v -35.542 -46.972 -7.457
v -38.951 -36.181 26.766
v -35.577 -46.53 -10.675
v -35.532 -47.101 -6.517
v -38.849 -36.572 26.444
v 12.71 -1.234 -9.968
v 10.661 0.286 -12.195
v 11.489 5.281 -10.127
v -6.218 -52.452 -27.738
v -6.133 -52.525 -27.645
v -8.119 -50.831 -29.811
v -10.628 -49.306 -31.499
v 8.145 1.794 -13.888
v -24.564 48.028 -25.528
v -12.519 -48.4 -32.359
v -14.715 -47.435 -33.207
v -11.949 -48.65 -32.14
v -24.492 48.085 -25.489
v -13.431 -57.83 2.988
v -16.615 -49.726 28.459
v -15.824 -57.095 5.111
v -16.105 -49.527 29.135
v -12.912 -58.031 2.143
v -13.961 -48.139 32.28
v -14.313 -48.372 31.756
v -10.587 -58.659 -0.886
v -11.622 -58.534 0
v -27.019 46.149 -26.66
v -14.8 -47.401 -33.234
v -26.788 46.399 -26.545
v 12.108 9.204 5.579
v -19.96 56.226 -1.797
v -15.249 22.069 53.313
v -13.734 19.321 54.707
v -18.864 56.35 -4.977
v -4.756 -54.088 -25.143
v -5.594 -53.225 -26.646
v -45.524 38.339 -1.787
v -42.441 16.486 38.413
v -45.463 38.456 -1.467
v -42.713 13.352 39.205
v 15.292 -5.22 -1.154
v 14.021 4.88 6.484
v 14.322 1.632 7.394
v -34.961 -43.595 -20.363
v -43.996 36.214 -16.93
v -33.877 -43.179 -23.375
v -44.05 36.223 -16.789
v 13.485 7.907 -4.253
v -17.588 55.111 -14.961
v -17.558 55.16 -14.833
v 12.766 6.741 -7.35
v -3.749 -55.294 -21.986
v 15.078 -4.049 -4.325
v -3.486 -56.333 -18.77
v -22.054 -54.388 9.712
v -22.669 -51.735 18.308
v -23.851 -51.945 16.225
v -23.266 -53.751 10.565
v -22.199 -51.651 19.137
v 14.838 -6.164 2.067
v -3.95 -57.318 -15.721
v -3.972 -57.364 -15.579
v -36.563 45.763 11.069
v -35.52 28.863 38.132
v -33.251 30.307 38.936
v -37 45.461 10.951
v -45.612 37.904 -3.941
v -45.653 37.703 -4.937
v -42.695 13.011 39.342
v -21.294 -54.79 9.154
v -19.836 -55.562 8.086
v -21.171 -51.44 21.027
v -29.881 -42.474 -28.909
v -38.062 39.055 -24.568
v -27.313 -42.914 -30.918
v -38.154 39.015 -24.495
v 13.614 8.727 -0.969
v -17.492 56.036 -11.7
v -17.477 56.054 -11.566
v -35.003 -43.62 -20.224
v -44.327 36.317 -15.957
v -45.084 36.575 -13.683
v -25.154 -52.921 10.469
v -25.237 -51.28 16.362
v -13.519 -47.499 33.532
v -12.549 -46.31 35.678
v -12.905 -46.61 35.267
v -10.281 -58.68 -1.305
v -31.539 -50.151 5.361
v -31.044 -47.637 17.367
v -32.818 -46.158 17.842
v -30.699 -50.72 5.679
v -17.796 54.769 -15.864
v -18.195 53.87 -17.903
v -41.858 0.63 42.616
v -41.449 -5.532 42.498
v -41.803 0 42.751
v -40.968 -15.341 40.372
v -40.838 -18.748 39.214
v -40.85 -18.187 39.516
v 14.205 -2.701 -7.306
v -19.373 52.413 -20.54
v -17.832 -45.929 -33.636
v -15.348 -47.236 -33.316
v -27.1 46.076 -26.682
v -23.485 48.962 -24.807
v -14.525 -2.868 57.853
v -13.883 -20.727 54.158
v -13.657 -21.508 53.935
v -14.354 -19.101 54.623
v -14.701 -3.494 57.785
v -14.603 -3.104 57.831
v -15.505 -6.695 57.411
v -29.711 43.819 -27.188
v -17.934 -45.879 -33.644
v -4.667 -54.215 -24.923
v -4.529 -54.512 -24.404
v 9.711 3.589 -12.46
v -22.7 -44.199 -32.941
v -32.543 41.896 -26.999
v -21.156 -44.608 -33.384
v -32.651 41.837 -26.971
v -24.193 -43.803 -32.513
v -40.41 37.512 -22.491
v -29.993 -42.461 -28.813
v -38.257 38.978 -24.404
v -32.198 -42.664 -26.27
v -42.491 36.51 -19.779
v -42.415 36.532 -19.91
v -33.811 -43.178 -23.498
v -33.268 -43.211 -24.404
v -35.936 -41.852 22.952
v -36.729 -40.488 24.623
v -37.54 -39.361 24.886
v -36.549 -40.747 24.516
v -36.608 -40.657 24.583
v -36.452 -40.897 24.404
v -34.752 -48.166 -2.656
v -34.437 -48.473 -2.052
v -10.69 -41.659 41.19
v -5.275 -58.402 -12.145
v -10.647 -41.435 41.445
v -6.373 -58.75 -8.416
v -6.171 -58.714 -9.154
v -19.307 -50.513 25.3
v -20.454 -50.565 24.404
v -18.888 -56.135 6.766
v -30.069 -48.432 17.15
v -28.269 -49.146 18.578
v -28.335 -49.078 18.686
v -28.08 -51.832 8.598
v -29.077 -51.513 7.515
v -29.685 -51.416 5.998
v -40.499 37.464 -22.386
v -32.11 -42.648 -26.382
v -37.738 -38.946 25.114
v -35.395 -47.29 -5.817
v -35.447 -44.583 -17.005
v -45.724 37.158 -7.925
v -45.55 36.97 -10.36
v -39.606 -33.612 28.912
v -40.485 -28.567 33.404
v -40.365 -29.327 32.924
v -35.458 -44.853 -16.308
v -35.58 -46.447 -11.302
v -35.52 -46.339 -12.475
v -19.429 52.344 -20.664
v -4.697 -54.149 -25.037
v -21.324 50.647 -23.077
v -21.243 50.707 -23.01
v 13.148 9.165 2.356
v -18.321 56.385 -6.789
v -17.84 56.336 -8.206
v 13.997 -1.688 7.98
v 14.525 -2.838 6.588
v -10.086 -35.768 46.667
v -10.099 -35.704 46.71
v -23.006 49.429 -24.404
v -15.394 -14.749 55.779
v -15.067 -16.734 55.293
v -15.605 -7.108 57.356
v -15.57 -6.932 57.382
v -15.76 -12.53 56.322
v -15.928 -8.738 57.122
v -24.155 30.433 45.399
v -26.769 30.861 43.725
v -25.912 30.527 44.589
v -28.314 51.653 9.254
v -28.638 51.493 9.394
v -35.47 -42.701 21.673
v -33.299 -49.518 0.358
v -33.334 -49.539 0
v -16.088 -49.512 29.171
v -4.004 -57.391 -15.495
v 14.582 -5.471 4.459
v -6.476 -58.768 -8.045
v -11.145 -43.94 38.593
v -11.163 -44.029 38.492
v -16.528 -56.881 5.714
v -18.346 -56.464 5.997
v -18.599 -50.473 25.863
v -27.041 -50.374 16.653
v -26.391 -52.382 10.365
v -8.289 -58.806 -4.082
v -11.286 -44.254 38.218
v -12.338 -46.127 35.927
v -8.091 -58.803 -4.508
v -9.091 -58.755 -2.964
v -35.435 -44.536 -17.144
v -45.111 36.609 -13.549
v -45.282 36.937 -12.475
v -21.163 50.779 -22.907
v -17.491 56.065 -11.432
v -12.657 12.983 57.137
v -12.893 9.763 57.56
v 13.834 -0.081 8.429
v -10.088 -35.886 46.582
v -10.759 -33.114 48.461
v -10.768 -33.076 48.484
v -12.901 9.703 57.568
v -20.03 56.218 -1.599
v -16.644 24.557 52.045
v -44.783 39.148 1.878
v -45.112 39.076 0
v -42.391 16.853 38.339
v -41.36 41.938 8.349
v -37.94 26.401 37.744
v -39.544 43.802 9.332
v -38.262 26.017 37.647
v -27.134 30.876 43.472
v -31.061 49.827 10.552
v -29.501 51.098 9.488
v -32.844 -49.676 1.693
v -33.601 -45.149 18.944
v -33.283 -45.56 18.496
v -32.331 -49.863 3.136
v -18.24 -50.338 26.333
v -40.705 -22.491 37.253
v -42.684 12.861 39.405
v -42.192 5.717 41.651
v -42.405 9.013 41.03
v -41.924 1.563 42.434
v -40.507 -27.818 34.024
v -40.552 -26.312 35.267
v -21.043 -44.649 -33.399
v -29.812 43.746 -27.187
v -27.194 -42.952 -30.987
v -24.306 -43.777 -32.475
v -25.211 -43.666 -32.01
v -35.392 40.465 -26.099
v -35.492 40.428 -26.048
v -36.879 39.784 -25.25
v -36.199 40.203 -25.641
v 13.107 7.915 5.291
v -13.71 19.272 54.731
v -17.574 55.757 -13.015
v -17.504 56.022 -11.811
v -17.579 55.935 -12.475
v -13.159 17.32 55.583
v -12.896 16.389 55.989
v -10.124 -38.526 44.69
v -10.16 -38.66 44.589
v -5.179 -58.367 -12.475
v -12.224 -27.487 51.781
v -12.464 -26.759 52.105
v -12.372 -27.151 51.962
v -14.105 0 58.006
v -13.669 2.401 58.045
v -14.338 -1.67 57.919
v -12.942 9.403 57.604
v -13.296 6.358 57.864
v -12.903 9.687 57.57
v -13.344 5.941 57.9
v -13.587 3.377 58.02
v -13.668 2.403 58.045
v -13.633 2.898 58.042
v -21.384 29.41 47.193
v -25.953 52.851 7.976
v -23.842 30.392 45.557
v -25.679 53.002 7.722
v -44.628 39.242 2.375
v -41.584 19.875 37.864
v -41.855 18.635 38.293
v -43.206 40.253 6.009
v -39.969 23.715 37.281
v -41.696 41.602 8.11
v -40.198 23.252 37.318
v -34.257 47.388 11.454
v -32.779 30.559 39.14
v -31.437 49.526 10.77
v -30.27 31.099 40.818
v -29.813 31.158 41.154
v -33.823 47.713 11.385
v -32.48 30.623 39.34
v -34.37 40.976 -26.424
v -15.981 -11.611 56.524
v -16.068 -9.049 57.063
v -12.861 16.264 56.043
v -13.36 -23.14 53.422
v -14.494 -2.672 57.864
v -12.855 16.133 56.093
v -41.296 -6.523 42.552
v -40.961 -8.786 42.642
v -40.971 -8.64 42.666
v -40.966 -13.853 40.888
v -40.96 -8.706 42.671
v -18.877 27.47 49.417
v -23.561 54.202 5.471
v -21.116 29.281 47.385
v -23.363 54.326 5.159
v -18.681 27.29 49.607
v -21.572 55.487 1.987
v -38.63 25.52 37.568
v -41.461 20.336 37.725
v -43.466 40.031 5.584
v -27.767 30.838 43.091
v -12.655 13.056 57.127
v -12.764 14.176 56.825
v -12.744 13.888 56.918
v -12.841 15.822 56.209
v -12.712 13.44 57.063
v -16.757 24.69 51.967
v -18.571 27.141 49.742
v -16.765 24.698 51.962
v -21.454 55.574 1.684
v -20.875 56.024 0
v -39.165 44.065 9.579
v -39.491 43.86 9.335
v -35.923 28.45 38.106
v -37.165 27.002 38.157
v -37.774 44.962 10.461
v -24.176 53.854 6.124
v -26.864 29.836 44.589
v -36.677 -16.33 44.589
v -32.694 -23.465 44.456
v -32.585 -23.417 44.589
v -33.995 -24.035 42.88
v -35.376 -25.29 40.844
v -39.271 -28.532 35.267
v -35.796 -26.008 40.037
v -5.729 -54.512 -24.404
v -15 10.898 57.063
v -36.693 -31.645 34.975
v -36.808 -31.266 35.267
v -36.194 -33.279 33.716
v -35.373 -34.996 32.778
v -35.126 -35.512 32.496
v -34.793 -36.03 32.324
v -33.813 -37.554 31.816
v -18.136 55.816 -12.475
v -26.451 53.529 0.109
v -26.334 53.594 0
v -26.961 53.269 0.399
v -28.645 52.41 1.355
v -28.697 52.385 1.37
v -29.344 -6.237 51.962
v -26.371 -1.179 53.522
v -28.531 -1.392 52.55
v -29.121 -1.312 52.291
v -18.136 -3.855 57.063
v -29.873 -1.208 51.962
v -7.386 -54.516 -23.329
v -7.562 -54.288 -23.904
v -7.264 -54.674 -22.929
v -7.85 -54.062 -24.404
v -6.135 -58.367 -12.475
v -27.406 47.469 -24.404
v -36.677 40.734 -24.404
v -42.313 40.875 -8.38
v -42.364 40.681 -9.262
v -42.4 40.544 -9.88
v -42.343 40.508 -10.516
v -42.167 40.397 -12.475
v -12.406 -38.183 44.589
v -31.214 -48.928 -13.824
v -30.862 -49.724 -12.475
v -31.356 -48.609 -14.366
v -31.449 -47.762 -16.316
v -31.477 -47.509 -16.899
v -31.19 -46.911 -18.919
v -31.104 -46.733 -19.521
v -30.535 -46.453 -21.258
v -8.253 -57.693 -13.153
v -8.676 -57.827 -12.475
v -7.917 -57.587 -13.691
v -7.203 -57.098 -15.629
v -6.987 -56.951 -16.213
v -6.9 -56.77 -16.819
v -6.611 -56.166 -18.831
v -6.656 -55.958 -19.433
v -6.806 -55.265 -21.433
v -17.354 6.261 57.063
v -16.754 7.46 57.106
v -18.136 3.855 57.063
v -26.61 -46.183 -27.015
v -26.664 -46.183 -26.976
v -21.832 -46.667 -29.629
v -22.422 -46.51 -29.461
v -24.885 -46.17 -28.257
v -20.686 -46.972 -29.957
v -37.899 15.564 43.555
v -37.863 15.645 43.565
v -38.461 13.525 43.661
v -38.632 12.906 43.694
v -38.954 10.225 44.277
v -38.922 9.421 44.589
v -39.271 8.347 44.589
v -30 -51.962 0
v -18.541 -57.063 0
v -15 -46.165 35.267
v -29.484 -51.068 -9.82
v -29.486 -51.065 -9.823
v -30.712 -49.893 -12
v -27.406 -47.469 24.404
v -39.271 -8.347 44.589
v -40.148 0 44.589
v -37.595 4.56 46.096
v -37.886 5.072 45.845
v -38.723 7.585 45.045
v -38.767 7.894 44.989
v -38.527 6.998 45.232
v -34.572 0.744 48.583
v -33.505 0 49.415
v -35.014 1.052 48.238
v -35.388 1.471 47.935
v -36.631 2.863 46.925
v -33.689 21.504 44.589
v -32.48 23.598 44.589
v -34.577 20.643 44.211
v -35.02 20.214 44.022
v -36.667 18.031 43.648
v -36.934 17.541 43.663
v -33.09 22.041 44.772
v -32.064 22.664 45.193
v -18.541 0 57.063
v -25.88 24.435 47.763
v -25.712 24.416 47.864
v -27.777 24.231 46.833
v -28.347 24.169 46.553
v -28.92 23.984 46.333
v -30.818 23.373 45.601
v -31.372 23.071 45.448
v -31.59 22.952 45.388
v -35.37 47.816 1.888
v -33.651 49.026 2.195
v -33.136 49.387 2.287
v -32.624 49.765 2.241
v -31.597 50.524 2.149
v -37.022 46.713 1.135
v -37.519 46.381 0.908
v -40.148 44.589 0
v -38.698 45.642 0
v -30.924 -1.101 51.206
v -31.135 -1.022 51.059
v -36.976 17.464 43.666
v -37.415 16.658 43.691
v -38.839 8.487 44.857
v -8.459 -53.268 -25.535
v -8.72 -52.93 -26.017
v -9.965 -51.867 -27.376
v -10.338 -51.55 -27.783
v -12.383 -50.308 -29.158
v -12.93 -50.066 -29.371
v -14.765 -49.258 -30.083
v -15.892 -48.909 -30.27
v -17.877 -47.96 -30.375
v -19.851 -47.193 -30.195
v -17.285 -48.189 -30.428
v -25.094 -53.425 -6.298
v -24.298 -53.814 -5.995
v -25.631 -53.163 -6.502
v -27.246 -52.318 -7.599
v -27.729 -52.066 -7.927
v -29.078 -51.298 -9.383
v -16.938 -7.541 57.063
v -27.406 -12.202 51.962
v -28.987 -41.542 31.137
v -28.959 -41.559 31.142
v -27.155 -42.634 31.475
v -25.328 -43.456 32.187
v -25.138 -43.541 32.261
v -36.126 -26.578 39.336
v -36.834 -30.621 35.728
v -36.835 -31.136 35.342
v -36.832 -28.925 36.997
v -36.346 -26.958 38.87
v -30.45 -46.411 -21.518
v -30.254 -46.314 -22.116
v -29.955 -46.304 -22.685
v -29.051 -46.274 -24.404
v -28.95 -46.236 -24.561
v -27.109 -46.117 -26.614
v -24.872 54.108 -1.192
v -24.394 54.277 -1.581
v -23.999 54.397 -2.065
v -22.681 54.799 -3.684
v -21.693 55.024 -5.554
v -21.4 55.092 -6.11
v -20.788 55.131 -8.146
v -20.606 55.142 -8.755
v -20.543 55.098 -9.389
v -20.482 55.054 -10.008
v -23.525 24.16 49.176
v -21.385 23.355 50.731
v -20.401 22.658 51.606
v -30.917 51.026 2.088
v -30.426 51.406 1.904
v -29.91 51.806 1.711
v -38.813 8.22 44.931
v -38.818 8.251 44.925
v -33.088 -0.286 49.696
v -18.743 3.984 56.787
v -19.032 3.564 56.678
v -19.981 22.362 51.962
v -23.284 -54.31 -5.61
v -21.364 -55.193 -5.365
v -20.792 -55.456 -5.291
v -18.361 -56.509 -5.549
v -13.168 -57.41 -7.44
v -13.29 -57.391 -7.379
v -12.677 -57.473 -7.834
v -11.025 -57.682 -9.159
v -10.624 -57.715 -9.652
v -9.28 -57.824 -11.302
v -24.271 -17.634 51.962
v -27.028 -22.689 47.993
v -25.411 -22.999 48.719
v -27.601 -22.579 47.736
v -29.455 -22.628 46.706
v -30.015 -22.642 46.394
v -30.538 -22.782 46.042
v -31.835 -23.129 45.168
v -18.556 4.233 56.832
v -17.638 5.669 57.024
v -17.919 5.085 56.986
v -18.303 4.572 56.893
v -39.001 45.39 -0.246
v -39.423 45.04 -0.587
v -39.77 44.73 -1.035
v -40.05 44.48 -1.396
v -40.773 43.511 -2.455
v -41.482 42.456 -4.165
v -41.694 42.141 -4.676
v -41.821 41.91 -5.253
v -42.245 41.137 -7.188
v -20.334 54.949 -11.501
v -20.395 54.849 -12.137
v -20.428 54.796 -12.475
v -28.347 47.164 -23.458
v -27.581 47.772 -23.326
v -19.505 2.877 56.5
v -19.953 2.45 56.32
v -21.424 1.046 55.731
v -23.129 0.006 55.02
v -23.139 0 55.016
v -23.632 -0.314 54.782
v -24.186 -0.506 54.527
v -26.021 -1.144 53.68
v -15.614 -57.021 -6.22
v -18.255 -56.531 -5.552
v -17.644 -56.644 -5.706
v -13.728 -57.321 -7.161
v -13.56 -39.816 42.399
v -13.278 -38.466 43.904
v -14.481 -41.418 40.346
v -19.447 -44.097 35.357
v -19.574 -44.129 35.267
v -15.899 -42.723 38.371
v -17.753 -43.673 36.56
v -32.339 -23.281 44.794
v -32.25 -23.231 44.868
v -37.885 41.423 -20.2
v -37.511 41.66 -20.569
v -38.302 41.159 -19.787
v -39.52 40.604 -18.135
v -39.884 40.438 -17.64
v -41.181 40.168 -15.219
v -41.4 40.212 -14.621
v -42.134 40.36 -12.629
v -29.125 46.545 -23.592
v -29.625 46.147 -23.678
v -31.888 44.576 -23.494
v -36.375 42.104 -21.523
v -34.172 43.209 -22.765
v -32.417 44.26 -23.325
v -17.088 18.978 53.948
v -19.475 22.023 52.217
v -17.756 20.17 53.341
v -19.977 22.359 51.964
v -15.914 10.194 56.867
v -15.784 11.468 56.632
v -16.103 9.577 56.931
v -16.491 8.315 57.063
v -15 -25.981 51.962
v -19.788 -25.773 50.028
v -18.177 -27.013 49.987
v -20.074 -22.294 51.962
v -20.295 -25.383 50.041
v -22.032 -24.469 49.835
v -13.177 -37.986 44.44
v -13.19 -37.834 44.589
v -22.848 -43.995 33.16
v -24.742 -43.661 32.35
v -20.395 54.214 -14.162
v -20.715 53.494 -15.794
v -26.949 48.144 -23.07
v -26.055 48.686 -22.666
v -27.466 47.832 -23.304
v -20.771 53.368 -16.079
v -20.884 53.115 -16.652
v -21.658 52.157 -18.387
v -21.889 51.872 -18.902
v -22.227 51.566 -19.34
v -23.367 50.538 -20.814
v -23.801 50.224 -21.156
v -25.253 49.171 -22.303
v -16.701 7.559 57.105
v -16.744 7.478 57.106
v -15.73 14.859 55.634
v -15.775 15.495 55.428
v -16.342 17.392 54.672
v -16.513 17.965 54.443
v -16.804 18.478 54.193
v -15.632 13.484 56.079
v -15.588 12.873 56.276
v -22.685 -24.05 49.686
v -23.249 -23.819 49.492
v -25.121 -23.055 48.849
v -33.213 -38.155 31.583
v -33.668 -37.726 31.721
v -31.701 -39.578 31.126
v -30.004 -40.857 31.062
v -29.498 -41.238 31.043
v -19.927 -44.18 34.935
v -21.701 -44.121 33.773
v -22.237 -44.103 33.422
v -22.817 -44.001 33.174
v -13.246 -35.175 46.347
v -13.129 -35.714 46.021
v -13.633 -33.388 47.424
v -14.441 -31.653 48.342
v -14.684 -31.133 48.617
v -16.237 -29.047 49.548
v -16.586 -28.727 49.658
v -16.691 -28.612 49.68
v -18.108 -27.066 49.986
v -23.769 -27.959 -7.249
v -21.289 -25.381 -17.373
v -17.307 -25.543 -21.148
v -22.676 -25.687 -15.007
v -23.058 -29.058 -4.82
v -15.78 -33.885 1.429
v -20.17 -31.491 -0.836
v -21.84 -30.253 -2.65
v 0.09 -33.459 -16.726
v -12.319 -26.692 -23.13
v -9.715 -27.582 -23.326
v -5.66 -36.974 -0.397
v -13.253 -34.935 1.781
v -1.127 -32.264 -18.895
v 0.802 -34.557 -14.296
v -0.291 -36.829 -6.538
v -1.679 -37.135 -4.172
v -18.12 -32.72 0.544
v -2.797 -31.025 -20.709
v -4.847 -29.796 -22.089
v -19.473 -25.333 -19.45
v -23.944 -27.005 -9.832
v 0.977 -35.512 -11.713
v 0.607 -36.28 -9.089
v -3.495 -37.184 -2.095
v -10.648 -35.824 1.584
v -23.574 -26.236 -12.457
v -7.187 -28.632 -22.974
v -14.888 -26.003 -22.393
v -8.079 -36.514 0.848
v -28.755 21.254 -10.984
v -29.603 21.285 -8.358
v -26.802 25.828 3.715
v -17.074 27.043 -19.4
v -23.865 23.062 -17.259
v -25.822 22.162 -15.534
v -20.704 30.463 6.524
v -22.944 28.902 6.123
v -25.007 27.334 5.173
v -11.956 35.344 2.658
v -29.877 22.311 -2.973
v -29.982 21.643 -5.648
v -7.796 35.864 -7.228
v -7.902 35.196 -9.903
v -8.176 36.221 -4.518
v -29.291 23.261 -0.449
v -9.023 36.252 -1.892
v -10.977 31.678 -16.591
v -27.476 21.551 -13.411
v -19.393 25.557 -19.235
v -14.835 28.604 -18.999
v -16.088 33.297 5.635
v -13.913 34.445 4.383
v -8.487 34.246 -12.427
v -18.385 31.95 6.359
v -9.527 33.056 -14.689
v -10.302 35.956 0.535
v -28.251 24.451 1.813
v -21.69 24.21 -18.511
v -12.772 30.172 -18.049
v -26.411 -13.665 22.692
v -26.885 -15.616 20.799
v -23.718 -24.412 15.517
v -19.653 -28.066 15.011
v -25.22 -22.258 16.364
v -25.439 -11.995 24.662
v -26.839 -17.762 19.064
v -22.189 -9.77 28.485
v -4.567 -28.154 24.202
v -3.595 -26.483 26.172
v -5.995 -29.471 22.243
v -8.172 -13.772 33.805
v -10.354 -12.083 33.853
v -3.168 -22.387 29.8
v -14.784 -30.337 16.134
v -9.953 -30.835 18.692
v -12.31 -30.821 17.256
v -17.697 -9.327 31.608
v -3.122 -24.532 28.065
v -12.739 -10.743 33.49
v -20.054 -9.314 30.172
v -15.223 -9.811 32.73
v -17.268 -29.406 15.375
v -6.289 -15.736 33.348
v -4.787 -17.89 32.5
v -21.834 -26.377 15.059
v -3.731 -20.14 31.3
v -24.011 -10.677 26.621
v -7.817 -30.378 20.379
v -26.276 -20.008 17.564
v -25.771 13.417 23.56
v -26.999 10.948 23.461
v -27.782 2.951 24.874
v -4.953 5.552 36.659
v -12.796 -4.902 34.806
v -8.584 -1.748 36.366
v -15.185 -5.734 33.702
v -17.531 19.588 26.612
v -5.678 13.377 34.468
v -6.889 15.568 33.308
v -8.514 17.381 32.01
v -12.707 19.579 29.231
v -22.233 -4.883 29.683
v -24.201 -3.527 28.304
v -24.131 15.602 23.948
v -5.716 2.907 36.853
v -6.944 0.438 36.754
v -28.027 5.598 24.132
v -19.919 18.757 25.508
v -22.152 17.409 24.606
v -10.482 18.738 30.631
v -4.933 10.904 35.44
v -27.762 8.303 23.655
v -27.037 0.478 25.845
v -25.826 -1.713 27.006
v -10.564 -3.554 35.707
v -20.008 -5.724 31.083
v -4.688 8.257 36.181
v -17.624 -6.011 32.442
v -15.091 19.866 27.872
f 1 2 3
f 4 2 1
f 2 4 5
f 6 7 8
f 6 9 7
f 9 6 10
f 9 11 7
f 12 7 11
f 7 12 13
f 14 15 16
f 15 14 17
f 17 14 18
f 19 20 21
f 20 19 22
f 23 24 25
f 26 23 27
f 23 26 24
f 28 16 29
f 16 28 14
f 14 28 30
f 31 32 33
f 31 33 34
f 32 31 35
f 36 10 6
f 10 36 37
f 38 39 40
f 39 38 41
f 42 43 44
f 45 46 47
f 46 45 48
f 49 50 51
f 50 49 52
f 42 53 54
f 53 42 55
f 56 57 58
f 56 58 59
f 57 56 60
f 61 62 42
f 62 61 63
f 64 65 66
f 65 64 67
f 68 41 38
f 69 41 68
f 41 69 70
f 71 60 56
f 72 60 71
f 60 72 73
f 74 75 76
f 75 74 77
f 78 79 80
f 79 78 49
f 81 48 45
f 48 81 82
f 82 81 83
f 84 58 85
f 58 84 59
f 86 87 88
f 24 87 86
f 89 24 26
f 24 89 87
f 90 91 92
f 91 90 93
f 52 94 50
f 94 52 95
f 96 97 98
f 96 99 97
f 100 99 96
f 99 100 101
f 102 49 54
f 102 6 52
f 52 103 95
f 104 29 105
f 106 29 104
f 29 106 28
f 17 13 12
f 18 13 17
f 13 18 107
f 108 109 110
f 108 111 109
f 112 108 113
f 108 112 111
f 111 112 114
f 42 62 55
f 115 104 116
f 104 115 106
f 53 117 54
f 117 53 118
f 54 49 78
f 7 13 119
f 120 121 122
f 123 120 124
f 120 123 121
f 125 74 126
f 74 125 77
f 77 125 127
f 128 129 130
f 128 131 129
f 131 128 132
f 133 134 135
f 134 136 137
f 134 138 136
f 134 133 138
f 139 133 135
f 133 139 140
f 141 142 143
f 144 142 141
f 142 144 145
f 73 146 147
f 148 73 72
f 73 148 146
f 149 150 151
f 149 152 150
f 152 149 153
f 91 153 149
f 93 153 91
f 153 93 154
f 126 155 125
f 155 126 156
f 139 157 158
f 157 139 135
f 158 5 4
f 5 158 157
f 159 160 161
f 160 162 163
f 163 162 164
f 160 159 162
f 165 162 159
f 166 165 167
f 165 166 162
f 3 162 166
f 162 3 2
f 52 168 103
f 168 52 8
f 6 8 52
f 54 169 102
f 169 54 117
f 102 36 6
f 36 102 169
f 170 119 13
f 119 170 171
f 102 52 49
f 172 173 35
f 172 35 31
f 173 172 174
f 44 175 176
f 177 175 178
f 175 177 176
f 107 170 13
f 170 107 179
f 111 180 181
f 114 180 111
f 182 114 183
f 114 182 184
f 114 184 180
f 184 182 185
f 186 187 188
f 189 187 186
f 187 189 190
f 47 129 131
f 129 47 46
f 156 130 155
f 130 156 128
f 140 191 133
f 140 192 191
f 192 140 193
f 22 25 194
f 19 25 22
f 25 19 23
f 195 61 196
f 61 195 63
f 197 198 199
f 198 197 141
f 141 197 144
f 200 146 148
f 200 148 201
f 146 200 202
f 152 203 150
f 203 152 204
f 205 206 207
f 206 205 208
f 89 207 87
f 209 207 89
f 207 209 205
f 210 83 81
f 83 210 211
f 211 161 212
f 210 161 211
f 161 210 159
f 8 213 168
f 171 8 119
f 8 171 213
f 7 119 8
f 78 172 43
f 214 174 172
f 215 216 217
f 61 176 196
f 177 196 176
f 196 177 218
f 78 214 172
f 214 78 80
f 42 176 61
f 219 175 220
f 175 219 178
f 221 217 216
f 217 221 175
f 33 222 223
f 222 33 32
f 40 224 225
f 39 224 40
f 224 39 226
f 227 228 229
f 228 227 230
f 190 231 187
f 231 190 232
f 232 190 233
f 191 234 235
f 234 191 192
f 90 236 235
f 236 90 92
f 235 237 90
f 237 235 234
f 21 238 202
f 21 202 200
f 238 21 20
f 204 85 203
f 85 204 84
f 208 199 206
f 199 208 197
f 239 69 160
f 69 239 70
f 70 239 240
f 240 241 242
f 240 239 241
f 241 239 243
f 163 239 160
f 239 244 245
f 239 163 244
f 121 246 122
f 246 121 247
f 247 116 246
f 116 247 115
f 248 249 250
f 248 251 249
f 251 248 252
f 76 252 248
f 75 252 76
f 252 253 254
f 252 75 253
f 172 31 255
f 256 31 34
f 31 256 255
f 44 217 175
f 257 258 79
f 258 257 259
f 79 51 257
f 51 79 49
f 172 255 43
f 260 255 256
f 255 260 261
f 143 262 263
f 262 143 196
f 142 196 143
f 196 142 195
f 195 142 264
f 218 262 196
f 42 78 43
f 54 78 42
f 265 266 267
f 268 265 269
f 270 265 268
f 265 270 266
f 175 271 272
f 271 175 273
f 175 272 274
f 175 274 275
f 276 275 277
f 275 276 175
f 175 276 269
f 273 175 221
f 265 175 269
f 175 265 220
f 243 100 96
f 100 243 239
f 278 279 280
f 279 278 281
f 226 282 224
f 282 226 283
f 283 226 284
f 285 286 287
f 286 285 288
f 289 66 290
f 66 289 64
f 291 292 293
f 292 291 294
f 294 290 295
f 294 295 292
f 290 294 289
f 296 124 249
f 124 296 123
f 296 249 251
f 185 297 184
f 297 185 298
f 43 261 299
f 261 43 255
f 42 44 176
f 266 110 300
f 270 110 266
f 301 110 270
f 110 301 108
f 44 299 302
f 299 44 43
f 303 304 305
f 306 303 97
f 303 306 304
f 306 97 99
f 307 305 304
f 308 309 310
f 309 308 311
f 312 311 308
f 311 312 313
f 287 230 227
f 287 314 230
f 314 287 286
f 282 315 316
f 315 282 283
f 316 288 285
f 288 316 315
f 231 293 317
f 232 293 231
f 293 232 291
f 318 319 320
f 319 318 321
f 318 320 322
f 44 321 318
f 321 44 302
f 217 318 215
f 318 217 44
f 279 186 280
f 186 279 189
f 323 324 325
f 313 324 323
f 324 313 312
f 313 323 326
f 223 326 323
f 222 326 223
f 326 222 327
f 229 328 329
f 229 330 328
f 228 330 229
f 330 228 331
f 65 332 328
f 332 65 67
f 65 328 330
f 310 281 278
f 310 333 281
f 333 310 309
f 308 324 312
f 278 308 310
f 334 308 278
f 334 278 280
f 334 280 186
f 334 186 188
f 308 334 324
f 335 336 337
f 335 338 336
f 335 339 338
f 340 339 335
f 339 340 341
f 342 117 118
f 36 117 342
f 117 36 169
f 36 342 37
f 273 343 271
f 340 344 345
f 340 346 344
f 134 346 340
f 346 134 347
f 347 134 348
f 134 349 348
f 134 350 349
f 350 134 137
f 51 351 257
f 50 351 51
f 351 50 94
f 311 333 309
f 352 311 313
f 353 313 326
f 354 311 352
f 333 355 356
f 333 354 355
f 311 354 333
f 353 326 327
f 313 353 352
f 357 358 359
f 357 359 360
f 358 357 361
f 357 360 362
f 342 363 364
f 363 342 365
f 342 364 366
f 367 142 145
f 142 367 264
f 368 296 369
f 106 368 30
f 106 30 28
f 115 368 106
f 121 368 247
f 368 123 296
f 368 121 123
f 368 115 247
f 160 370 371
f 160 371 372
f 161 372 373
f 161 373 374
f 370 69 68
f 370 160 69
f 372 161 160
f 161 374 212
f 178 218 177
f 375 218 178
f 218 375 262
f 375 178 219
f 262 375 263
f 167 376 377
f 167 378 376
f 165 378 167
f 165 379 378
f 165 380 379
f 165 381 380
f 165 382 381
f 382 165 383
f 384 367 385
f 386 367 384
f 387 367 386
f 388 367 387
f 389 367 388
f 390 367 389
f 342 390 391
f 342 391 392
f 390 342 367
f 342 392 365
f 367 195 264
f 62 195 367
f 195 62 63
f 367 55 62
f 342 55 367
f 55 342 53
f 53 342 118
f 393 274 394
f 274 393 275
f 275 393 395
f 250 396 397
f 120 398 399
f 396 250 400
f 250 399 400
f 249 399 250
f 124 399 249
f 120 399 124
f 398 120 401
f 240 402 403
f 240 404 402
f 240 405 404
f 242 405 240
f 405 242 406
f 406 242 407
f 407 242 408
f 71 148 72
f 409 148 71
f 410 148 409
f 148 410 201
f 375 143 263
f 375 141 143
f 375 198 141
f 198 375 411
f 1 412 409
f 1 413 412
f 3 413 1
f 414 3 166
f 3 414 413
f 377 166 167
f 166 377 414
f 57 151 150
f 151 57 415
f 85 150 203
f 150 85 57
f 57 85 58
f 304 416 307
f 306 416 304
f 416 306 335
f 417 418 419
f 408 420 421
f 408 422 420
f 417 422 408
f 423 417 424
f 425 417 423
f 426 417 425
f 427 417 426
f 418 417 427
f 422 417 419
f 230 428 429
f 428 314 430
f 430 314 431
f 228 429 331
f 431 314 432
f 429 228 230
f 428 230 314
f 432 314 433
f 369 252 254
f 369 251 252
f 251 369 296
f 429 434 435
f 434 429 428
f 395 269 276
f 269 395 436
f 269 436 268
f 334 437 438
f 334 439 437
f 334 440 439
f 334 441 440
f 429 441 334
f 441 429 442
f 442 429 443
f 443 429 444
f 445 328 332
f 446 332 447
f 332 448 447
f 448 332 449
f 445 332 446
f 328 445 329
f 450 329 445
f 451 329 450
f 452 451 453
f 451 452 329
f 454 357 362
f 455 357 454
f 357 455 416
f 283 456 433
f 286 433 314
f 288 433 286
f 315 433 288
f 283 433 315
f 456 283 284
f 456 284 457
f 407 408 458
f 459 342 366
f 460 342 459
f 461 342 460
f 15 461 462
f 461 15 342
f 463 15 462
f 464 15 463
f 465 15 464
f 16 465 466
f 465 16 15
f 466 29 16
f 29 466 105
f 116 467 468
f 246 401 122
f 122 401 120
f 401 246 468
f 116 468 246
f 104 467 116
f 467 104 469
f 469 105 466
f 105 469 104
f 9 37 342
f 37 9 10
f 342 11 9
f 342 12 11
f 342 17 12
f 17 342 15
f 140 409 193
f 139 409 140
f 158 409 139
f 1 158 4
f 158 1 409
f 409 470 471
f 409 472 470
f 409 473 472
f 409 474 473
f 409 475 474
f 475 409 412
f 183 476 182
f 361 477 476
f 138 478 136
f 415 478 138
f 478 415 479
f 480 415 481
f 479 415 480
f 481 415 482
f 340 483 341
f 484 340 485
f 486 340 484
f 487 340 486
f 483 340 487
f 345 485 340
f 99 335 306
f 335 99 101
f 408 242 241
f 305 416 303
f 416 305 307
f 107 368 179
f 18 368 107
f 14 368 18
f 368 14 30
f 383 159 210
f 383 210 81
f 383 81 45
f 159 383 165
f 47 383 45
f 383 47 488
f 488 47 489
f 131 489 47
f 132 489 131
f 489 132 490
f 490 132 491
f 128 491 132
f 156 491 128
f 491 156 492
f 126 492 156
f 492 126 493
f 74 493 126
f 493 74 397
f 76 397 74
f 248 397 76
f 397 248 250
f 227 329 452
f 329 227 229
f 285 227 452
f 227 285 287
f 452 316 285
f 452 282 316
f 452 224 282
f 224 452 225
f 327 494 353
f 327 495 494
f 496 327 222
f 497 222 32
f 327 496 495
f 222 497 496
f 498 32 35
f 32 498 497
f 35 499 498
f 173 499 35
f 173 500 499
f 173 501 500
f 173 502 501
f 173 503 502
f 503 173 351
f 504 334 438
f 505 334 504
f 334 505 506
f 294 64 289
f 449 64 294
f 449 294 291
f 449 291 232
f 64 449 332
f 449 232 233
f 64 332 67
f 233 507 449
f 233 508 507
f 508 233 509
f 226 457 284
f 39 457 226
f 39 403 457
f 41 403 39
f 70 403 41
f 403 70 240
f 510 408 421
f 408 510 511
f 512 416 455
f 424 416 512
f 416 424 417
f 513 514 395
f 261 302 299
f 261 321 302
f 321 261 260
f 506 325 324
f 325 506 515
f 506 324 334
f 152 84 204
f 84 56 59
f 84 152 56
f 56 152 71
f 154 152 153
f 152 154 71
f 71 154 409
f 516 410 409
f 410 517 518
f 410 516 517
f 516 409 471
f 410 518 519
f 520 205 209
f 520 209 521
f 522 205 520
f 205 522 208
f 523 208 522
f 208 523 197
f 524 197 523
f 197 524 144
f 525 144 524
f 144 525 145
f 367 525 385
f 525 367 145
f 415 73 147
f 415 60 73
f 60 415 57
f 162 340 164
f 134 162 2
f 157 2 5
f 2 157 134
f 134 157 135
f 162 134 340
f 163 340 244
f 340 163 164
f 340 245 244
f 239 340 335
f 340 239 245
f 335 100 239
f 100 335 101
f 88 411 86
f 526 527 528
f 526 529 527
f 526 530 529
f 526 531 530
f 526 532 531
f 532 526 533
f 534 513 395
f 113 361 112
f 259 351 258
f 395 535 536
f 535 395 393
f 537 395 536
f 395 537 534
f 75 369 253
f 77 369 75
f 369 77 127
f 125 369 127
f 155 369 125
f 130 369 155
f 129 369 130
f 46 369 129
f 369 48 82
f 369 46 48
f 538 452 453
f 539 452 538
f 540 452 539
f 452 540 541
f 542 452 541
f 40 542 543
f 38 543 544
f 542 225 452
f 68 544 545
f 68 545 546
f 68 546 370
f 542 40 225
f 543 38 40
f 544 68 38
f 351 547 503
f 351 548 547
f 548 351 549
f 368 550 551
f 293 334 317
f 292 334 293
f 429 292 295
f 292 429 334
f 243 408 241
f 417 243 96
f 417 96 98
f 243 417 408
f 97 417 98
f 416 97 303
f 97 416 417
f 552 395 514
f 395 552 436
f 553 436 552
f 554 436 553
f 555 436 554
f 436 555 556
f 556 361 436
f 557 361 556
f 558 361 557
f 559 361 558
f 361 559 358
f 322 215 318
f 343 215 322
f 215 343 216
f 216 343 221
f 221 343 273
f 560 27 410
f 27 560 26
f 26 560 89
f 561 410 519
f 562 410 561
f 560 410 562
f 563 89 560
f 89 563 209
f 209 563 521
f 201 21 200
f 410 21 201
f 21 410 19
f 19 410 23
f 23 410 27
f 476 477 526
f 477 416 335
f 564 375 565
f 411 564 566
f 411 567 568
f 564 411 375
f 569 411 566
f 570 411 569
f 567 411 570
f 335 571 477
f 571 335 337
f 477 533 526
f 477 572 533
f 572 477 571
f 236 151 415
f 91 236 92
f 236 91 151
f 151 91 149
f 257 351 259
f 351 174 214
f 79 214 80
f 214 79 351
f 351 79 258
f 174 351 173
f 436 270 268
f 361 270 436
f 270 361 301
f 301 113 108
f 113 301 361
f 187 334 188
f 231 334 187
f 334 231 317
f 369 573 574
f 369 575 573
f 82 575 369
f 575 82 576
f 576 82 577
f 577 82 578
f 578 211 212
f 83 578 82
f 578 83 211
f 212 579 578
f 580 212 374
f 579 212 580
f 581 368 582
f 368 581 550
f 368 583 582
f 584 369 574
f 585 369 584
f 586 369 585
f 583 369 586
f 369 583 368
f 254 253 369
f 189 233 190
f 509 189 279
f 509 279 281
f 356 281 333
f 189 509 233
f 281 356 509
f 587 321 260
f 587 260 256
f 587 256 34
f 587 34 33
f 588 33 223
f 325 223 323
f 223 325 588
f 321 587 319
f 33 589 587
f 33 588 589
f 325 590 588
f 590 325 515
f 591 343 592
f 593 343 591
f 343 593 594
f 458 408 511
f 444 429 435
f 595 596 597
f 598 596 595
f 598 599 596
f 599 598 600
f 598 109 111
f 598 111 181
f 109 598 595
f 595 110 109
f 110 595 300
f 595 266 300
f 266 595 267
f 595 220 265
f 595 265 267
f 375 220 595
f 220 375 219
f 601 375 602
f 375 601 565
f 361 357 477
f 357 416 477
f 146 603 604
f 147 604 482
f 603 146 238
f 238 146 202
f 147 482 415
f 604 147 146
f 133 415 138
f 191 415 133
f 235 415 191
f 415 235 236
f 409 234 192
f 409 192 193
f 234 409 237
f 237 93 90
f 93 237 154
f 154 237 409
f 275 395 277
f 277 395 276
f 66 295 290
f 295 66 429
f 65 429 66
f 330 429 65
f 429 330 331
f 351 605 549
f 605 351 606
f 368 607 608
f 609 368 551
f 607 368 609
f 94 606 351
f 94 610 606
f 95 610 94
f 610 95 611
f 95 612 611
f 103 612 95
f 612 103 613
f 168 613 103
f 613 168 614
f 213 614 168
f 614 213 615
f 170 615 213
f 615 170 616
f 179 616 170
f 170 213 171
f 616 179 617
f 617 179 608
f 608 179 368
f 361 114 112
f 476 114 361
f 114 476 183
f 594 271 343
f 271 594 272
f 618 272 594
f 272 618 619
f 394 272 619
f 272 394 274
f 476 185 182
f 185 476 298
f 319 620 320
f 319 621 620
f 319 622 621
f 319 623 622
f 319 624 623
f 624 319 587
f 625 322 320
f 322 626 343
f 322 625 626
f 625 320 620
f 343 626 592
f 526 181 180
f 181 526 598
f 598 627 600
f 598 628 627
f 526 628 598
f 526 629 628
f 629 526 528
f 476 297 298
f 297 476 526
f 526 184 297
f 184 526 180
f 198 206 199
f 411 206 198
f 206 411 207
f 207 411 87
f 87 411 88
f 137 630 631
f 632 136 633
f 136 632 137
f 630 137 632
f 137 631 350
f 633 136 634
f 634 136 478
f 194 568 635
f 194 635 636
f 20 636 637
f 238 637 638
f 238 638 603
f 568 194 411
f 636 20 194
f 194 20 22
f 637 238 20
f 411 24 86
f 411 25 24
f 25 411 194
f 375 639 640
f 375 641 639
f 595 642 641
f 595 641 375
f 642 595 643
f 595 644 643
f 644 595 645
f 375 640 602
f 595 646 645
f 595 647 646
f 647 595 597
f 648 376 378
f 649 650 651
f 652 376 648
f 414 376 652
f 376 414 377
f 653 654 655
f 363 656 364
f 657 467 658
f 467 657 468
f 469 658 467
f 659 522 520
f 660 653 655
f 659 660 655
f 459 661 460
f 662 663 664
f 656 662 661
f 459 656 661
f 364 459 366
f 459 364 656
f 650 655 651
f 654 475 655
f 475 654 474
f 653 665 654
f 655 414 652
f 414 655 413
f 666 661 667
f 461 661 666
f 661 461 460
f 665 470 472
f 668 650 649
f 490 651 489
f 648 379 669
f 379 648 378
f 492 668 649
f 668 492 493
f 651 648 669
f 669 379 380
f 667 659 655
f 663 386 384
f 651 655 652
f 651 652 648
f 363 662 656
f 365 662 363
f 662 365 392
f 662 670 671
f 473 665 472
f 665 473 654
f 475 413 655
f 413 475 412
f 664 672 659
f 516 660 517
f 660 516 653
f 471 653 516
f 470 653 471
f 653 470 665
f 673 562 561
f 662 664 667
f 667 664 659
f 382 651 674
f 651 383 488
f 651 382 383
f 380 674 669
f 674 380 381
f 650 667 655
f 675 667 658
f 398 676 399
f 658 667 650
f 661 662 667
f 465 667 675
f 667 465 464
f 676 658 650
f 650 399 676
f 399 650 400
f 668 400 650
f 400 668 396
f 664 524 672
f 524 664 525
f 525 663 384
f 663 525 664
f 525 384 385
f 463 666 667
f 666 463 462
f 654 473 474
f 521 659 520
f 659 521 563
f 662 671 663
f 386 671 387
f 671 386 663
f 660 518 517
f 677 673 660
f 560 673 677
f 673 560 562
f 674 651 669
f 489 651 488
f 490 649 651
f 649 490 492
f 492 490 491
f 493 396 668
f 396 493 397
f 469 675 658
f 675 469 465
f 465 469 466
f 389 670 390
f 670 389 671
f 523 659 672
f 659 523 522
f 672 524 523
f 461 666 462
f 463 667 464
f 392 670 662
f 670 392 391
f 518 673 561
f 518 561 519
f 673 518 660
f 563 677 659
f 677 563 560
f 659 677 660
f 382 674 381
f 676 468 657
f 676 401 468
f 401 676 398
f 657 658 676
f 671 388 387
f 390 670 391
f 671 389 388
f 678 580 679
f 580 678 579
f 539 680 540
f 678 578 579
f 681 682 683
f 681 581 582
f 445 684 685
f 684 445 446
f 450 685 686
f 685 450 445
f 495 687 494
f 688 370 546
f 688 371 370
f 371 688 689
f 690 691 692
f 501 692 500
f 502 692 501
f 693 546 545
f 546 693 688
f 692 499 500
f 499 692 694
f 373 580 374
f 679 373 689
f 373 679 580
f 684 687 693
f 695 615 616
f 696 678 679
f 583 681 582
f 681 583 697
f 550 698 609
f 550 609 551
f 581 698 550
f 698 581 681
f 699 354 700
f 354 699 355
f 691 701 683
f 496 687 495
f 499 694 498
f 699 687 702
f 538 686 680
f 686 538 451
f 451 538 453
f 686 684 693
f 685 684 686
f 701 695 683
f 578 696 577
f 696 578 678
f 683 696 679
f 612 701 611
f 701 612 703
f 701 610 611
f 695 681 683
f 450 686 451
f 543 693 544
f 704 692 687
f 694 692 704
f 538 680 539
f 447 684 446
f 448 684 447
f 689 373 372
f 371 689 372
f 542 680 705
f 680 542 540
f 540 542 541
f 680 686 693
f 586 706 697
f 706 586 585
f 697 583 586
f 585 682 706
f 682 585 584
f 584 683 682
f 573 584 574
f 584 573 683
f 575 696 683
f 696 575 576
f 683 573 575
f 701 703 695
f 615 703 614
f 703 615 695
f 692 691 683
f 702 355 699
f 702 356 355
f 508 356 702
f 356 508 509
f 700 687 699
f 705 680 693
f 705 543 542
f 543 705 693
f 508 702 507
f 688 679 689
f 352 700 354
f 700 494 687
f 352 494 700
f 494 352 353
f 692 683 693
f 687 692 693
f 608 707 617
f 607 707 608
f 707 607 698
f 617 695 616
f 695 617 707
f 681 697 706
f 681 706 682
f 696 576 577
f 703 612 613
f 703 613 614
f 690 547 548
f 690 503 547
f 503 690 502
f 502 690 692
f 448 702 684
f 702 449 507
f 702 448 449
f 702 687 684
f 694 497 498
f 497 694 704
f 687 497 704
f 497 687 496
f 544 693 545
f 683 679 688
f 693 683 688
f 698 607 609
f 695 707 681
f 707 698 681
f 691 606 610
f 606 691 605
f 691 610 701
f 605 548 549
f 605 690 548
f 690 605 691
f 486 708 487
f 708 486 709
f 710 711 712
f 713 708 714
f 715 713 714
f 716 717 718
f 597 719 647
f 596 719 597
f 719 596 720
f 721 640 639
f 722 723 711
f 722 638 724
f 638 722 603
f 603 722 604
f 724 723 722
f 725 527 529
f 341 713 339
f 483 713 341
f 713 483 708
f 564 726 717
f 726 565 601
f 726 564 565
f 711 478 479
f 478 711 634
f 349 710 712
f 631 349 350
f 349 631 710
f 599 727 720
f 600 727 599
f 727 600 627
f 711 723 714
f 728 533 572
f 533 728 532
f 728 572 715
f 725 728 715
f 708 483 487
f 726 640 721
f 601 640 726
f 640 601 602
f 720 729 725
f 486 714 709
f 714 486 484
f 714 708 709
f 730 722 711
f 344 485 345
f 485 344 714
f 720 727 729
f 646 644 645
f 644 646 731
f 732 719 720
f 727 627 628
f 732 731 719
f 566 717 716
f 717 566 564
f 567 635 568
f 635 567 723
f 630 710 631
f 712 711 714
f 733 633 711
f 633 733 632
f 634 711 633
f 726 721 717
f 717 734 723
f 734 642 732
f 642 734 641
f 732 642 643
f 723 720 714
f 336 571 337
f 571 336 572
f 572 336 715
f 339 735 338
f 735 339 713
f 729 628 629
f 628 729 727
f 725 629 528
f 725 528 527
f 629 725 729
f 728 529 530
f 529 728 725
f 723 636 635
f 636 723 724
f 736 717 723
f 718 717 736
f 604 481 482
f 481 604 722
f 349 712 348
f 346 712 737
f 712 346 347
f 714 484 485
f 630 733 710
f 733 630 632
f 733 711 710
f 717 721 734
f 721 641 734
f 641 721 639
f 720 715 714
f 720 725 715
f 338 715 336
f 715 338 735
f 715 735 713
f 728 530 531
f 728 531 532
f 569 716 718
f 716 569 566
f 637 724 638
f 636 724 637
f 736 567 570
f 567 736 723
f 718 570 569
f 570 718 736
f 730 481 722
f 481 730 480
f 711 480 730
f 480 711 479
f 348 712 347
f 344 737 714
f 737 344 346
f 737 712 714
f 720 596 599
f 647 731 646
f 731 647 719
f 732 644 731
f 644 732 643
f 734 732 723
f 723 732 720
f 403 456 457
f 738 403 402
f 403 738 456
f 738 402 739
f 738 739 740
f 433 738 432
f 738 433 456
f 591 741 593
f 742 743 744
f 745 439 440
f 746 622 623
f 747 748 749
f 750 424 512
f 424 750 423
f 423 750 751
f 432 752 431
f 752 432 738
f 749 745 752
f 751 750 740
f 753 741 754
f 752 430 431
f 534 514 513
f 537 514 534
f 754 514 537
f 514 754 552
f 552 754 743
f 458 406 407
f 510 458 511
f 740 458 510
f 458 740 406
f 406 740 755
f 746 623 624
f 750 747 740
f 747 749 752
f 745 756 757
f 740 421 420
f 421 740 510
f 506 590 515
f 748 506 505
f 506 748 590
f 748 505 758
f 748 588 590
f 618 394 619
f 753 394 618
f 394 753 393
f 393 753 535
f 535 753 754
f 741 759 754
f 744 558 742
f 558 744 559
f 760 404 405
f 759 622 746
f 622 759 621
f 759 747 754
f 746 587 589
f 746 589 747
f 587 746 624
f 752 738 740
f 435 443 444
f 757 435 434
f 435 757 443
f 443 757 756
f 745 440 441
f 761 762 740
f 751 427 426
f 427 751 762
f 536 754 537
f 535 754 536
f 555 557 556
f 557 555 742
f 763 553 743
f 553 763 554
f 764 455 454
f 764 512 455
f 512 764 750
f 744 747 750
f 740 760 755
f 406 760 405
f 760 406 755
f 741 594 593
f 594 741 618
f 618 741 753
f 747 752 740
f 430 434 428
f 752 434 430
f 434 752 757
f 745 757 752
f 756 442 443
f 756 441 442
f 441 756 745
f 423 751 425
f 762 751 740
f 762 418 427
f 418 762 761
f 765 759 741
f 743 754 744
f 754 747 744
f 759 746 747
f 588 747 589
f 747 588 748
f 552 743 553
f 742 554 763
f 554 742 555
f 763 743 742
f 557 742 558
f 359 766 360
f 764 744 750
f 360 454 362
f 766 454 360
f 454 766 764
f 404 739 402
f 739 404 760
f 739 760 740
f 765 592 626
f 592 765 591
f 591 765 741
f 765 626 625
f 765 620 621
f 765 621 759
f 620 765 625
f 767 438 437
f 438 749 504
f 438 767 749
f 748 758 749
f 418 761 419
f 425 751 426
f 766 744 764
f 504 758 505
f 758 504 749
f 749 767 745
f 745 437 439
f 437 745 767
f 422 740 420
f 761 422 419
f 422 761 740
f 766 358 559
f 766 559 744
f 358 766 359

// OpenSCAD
difference() {
	intersection() {
		hull() {
			rotate(a = -150.2044300830, v = [0.1221199000, -0.4816670653, 0.0000000000]) {
				rotate(a = -90.0000000000, v = [-0.6087614290, -0.7933533403, 0.0000000000]) {
					cylinder(h = 60, r = 16.2000000000);
				}
			}
			rotate(a = -150.2044300830, v = [0.1221199000, -0.4816670653, 0.0000000000]) {
				rotate(a = -90.0000000000, v = [0.9914448614, -0.1305261922, 0.0000000000]) {
					cylinder(h = 60, r = 16.2000000000);
				}
			}
			rotate(a = -150.2044300830, v = [0.1221199000, -0.4816670653, 0.0000000000]) {
				rotate(a = -151.9205722594, v = [-0.4033545694, -0.2426087124, 0.0000000000]) {
					cylinder(h = 60, r = 16.2000000000);
				}
			}
			rotate(a = -150.2044300830, v = [0.1221199000, -0.4816670653, 0.0000000000]) {
				rotate(a = -161.5616070448, v = [0.2783292144, 0.1502295517, -0.0000000000]) {
					cylinder(h = 60, r = 16.2000000000);
				}
			}
		}
		sphere(r = 60);
	}
	union() {
		rotate(a = -150.2044300830, v = [0.1221199000, -0.4816670653, 0.0000000000]) {
			rotate(a = -90.0000000000, v = [-0.6087614290, -0.7933533403, 0.0000000000]) {
				translate(v = [0, 0, 35]) {
					cylinder(h = 100, r = 13.2000000000);
				}
			}
		}
		rotate(a = -150.2044300830, v = [0.1221199000, -0.4816670653, 0.0000000000]) {
			rotate(a = -90.0000000000, v = [0.9914448614, -0.1305261922, 0.0000000000]) {
				translate(v = [0, 0, 35]) {
					cylinder(h = 100, r = 13.2000000000);
				}
			}
		}
		rotate(a = -150.2044300830, v = [0.1221199000, -0.4816670653, 0.0000000000]) {
			rotate(a = -151.9205722594, v = [-0.4033545694, -0.2426087124, 0.0000000000]) {
				translate(v = [0, 0, 35]) {
					cylinder(h = 100, r = 13.2000000000);
				}
			}
		}
		rotate(a = -150.2044300830, v = [0.1221199000, -0.4816670653, 0.0000000000]) {
			rotate(a = -161.5616070448, v = [0.2783292144, 0.1502295517, -0.0000000000]) {
				translate(v = [0, 0, 35]) {
					cylinder(h = 100, r = 13.2000000000);
				}
			}
		}
	}
}
